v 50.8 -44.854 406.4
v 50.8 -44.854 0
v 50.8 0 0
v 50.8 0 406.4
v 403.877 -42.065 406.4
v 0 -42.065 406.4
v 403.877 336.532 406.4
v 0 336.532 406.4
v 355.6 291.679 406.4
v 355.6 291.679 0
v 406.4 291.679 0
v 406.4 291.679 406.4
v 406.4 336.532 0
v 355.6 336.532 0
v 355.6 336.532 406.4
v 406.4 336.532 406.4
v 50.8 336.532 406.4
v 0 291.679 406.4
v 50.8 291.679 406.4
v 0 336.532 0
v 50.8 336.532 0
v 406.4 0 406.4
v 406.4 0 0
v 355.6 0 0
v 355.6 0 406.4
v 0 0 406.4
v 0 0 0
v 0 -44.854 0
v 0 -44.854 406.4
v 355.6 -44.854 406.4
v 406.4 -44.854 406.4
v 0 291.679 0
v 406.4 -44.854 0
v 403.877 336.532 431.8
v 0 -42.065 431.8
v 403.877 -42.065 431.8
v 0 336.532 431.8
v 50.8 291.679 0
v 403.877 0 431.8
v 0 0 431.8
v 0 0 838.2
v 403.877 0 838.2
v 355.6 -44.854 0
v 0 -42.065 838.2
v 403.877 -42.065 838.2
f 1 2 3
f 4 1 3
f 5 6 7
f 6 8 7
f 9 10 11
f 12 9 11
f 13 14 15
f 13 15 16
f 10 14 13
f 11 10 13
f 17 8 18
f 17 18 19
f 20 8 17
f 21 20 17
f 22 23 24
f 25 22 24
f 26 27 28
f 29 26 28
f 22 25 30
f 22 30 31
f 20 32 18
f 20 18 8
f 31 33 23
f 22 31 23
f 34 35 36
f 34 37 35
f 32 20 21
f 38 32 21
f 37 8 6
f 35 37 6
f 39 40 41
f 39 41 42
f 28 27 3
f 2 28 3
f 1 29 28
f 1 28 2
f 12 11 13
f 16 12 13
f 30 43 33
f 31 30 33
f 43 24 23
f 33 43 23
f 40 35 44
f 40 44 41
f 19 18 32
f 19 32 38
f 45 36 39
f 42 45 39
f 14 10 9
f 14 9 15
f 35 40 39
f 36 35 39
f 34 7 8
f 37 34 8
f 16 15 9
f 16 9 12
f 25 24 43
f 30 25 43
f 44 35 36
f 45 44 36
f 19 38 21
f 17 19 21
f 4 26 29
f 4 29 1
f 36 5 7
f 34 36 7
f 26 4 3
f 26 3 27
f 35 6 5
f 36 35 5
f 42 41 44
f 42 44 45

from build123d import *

# Parameters (mm, degrees)
F1_DEPTH = 406.4
F0_W     = 50.8
F0_H     = 44.8537981102
F2_W     = 50.8
F2_H     = 44.8537981102
F3_DEPTH = 25.4
F4_W     = 403.8771986961
F4_H     = 42.064961046
F5_DEPTH = 406.4


# Not quite as in the source:
# - a feature names something its author has since deleted; it is built from what else it names


with BuildPart() as f1:
    # F0 (on Top) → F1 (new body)
    with BuildSketch(Plane.XY):
        Polygon((50.8, 0), (0, 0), (0, -44.8537981102), (50.8, -44.8537981102), (50.8, -22.4268990551), align=None)
    extrude(amount=F1_DEPTH)


with BuildPart() as f1b:
    # F0 (on Top) → F1, piece 2 (new body)
    with BuildSketch(Plane.XY):
        with Locations((381, 314.1055959259)):
            Rectangle(F0_W, F0_H)
    extrude(amount=F1_DEPTH)


with BuildPart() as f1c:
    # F0 (on Top) → F1, piece 3 (new body)
    with BuildSketch(Plane.XY):
        Polygon((355.6, 0), (355.6, -22.4268990551), (355.6, -44.8537981102), (406.4, -44.8537981102), (406.4, 0), align=None)
    extrude(amount=F1_DEPTH)


with BuildPart() as f1d:
    # F0 (on Top) → F1, piece 4 (new body)
    with BuildSketch(Plane.XY):
        with Locations((25.4, 314.1055959259)):
            Rectangle(F0_W, F0_H)
    extrude(amount=F1_DEPTH)


with BuildPart() as f3:
    # F2 (on face) → F3 (new body)
    with BuildSketch(Plane.XY.offset(406.4)):
        Polygon((50.8, 291.6786968708), (0, 291.6786968708), (0, -42.064961046), (403.8771986961, -42.064961046), (403.8771986961, 336.532494981), (50.8, 336.532494981), align=None)
        with Locations((25.4, 314.1055959259)):
            Rectangle(F2_W, F2_H)
    extrude(amount=F3_DEPTH)


with BuildPart() as f5:
    # F4 (on face) → F5 (new body)
    with BuildSketch(Plane.XY.offset(431.8)):
        with Locations((201.9385993481, -21.032480523)):
            Rectangle(F4_W, F4_H)
    extrude(amount=F5_DEPTH)


solid = Compound([f1.part, f1b.part, f1c.part, f1d.part, f3.part, f5.part])
